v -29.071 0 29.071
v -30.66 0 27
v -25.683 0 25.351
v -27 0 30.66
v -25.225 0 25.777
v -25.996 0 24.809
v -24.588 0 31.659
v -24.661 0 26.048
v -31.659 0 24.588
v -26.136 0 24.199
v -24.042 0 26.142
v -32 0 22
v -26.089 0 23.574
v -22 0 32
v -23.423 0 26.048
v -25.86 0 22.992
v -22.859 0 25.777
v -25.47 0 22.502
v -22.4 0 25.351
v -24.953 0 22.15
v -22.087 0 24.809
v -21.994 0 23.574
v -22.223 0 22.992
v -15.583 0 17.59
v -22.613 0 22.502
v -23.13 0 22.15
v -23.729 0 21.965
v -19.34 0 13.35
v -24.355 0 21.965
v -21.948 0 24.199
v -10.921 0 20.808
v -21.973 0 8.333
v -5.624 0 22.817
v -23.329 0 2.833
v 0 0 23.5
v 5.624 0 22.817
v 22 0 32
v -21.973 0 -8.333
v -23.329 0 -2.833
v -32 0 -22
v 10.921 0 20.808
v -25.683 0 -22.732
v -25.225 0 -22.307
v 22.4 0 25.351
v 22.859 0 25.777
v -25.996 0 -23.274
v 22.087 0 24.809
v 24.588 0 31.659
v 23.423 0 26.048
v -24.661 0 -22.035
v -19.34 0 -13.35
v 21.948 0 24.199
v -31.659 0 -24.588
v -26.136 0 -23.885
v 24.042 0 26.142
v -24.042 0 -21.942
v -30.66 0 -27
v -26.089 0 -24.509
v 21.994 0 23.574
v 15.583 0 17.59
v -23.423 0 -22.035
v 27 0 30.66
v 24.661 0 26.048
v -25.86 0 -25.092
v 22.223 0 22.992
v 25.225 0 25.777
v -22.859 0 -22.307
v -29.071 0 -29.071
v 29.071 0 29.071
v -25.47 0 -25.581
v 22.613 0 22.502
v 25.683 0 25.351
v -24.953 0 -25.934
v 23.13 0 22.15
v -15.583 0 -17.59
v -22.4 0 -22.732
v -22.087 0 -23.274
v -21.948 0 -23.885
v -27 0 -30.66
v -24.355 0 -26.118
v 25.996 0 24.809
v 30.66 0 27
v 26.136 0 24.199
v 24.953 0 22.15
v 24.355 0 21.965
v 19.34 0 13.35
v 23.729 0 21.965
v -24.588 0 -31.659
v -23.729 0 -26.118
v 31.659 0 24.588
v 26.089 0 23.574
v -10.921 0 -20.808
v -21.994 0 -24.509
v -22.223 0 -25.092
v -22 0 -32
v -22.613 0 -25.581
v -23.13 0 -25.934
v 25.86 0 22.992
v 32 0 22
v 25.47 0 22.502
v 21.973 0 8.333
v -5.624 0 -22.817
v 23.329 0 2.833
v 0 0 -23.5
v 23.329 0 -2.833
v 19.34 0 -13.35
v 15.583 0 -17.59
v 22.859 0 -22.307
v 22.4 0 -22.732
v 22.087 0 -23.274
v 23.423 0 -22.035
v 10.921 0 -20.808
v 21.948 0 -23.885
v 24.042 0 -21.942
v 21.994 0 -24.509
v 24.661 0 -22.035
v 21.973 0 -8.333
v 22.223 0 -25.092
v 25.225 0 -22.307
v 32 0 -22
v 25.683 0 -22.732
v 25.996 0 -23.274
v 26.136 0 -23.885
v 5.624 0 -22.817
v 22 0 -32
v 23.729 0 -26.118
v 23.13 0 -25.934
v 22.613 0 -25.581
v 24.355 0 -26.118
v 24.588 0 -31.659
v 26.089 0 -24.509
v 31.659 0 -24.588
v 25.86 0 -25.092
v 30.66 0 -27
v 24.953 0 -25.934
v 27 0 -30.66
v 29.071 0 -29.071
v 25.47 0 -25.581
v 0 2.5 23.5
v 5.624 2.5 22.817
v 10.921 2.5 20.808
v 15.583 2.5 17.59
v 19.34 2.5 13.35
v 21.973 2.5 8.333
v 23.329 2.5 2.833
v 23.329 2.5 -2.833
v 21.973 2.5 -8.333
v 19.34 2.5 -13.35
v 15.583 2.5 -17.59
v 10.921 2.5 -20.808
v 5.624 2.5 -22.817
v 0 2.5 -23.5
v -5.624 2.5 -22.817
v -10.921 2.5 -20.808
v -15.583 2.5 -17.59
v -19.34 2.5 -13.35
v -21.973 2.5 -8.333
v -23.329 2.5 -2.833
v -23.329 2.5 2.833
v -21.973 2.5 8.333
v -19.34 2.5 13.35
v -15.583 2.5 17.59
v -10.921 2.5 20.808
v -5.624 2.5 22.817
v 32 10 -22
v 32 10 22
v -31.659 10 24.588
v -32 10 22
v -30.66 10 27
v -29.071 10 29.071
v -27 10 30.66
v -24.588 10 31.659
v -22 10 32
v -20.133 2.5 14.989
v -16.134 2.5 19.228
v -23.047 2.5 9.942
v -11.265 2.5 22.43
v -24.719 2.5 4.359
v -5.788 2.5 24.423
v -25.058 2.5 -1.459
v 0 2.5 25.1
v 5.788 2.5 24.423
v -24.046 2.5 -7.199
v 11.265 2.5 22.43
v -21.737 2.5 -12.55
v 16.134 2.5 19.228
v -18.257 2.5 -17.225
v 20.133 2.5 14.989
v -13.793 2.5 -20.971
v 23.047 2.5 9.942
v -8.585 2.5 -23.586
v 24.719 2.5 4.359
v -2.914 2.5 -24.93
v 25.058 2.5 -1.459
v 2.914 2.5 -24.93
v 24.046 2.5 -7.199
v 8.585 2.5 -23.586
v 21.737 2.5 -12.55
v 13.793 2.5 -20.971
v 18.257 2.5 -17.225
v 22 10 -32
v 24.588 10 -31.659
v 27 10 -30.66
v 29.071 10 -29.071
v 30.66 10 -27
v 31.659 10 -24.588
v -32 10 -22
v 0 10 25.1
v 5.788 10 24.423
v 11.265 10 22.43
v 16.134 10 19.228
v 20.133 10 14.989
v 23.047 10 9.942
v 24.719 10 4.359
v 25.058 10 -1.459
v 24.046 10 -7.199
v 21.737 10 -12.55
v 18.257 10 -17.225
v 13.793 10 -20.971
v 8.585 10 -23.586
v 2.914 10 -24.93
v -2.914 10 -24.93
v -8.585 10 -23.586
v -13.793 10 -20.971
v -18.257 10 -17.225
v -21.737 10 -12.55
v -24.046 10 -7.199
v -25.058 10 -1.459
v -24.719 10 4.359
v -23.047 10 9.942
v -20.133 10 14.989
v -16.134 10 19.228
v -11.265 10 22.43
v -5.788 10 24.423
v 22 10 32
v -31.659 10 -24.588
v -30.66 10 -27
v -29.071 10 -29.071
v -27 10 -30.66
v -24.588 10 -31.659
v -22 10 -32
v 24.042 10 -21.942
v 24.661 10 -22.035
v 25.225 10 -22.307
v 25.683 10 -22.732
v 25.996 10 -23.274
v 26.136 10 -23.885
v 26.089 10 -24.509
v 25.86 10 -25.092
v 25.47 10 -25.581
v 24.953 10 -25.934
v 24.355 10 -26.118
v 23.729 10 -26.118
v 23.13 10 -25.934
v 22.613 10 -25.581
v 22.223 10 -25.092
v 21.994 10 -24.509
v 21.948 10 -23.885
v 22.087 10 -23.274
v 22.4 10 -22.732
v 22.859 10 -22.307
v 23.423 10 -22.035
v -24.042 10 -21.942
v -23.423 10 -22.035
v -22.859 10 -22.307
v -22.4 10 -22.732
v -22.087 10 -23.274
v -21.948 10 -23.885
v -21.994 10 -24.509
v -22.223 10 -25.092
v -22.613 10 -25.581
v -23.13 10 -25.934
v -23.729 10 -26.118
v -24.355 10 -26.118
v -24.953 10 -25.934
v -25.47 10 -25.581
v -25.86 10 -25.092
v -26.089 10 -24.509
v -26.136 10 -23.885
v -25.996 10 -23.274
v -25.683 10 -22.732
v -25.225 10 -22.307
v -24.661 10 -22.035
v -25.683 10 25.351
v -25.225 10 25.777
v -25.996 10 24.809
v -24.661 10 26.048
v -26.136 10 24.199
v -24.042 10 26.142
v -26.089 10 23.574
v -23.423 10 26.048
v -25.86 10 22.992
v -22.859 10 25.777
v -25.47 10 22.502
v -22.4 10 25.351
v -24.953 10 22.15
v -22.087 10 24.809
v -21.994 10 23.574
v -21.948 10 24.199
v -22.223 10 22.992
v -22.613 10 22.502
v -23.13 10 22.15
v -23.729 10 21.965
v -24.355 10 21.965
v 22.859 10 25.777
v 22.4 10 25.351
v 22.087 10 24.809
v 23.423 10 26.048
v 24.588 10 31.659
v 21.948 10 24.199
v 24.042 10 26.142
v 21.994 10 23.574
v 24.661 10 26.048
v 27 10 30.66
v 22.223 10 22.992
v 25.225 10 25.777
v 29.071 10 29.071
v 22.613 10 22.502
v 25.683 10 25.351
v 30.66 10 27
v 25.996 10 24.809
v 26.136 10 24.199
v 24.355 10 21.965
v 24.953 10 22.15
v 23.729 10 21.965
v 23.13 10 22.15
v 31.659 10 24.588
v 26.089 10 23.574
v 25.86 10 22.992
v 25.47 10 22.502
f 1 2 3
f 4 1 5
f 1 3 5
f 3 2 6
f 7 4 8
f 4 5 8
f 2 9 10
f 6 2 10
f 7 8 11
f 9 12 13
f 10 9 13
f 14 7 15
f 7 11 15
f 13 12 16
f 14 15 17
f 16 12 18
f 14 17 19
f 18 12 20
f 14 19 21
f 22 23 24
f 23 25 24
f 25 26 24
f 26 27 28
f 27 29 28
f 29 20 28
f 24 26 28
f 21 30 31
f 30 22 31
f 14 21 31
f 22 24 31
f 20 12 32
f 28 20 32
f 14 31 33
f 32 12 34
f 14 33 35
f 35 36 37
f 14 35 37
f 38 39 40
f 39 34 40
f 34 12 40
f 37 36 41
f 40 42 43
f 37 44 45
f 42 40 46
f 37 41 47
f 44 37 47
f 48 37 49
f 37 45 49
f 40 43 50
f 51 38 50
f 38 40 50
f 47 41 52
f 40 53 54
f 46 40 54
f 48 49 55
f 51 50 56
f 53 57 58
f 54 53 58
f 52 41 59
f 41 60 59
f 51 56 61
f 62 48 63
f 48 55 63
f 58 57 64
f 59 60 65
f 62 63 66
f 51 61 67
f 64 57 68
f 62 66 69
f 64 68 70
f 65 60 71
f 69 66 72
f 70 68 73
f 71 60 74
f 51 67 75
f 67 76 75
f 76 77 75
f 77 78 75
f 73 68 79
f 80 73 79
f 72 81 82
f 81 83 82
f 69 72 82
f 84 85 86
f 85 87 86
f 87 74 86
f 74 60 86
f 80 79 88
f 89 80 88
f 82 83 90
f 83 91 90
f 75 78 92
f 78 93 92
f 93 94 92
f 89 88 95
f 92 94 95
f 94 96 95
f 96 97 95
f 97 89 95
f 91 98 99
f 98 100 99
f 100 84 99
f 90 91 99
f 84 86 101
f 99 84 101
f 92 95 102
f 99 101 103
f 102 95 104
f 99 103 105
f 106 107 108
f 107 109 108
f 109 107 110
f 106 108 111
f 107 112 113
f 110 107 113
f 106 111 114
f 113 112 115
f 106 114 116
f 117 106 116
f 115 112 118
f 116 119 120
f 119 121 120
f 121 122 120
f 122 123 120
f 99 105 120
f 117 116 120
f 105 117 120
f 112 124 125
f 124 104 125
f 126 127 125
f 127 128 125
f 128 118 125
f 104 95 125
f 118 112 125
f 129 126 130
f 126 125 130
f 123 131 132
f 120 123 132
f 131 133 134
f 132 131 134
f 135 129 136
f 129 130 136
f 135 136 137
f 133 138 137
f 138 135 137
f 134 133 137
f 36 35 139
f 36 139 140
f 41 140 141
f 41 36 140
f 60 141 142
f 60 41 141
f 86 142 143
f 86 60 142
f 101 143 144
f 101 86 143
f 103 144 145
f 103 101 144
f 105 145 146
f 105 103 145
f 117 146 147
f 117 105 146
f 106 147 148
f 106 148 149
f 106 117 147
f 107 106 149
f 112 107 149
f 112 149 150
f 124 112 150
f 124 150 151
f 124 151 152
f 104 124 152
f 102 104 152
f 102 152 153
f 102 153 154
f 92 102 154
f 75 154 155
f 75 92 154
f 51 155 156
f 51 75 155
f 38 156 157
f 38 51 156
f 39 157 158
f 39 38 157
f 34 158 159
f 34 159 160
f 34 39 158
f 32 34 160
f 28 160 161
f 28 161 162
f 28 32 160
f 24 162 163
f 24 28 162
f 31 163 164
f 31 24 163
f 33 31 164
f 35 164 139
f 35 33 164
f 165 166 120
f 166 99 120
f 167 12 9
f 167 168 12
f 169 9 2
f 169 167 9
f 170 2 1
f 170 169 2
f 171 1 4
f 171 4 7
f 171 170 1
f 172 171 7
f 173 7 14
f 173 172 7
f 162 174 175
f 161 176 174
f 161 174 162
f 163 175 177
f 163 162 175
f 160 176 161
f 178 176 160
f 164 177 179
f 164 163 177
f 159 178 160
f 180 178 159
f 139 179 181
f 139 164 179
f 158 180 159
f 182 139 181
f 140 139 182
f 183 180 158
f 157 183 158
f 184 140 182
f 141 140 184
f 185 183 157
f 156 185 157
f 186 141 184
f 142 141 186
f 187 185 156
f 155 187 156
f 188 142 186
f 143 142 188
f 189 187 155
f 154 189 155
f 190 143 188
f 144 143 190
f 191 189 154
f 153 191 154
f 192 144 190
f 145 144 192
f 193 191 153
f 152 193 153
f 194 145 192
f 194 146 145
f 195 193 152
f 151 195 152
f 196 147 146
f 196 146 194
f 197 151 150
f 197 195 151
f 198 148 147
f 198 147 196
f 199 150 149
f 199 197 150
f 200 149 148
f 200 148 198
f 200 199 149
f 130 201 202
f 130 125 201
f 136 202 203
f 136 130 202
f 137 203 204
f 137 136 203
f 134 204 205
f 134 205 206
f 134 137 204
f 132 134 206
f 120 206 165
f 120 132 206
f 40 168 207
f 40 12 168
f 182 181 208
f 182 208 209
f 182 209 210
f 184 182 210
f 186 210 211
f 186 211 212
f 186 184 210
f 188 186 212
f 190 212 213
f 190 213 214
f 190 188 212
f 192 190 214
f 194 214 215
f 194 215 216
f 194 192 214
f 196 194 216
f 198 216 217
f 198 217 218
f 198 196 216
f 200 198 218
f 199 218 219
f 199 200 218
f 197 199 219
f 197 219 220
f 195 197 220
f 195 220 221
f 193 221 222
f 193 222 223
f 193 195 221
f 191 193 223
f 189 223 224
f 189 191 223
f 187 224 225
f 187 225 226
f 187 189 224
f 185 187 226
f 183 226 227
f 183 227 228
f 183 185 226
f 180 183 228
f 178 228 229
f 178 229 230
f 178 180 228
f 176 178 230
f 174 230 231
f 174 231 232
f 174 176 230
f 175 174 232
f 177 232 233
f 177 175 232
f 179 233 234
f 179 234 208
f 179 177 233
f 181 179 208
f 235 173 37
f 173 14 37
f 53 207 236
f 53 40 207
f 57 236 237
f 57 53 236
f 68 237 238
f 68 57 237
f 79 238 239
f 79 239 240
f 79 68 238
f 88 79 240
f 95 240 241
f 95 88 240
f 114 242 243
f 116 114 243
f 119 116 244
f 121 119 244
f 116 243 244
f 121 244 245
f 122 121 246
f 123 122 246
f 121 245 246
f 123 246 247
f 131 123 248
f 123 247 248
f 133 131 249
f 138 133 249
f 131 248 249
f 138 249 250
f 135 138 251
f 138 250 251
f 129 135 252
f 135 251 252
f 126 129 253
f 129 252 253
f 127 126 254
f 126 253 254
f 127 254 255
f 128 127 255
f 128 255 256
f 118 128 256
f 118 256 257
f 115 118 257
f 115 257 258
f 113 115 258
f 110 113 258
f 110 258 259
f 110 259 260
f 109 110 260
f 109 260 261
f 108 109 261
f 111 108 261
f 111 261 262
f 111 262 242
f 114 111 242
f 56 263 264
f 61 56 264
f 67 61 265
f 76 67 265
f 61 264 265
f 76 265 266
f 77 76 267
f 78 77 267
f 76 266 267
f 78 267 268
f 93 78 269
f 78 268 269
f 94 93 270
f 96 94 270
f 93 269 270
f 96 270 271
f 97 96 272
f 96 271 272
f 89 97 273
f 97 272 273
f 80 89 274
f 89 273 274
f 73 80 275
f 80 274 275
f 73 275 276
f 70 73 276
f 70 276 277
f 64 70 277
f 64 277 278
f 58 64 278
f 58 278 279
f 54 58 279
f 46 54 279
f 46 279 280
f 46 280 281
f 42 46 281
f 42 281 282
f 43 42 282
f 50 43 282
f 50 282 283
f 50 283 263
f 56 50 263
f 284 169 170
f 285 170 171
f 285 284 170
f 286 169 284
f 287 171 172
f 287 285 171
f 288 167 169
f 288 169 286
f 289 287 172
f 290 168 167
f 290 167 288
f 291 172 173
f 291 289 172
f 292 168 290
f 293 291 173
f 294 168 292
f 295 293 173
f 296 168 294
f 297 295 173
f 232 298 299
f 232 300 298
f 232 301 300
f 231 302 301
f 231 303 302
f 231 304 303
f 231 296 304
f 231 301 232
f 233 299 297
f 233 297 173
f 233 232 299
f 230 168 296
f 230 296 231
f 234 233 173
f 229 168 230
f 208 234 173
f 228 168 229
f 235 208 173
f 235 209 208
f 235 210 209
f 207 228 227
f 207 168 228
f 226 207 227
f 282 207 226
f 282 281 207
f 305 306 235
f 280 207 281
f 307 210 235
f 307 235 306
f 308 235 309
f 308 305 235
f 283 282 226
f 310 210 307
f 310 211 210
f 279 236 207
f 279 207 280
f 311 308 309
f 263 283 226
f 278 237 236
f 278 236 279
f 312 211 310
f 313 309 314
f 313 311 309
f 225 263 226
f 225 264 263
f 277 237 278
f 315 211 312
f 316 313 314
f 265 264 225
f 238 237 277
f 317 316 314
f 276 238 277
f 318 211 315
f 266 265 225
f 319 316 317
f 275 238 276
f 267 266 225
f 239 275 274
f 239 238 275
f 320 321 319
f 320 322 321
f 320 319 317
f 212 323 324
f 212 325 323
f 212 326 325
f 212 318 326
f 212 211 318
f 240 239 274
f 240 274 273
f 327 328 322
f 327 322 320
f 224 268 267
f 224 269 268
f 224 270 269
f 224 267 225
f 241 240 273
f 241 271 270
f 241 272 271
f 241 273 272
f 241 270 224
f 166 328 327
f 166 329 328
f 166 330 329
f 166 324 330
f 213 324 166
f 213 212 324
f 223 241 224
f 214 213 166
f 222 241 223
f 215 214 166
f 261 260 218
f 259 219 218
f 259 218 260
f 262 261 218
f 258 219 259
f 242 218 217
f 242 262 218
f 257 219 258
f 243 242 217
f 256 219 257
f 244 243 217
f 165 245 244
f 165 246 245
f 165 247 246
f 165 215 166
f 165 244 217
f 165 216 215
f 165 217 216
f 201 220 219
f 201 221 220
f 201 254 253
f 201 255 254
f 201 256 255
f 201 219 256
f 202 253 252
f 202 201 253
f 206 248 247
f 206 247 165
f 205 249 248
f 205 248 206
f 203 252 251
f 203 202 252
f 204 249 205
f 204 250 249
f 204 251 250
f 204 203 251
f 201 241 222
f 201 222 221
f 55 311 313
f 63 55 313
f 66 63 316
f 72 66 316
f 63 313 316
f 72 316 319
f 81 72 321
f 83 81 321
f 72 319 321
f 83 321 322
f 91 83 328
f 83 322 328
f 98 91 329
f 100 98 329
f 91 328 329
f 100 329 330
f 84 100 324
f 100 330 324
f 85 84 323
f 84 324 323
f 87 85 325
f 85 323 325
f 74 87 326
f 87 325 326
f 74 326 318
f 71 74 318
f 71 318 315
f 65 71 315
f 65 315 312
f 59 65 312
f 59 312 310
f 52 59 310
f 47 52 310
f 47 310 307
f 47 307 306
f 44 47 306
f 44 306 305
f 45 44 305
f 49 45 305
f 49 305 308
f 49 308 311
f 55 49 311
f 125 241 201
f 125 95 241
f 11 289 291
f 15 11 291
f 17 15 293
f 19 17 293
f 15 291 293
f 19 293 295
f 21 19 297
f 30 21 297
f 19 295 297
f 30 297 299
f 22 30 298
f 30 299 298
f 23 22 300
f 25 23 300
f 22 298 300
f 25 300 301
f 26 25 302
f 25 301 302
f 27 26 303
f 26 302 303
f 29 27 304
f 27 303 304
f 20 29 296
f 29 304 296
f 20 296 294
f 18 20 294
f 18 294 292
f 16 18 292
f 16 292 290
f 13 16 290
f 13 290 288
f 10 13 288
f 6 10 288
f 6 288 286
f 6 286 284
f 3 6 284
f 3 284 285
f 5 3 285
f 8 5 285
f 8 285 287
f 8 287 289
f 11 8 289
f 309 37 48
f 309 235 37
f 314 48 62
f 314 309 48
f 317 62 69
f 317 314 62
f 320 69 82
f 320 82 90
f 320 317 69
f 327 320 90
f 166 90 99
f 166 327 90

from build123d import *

# Parameters (mm, degrees)
SKETCH_1_W          = 64
SKETCH_1_H          = 64
SKETCH_1_R          = 23.5
EXTRUDE_1_DEPTH     = 2.5
SKETCH_2_W          = 64
SKETCH_2_H          = 64
SKETCH_2_R          = 25.1
EXTRUDE_2_DEPTH     = 7.5
SKETCH_3_R          = 2.1
CUT_EXTRUDE_1_DEPTH = 20
FILLET_1_R          = 10


with BuildPart() as part:
    # 草图1 → 凸台-拉伸1 (new body)
    with BuildSketch(Plane(origin=(0, 0, 0), x_dir=(1, 0, 0), z_dir=(0, 1, 0))):
        Rectangle(SKETCH_1_W, SKETCH_1_H)
        with Locations(Location((0, 0, 0), (0, 0, 270))):
            Circle(SKETCH_1_R, mode=Mode.SUBTRACT)
    extrude(amount=EXTRUDE_1_DEPTH)

    # 草图2 → 凸台-拉伸2 (add)
    with BuildSketch(Plane(origin=(0, 2.5, 0), x_dir=(1, 0, 0), z_dir=(0, 1, 0))):
        Rectangle(SKETCH_2_W, SKETCH_2_H)
        with Locations(Location((0, 0, 0), (0, 0, 270))):
            Circle(SKETCH_2_R, mode=Mode.SUBTRACT)
    extrude(amount=EXTRUDE_2_DEPTH)

    # 草图3 → 切除-拉伸1 (cut)
    with BuildSketch(Plane(origin=(0, 10, 0), x_dir=(1, 0, 0), z_dir=(0, 1, 0))):
        with Locations(Location((24.04163056, 24.04163056, 0), (0, 0, 270))):
            Circle(SKETCH_3_R)
        with Locations(Location((24.04163056, -24.04163056, 0), (0, 0, 270))):
            Circle(SKETCH_3_R)
        with Locations(Location((-24.04163056, -24.04163056, 0), (0, 0, 270))):
            Circle(SKETCH_3_R)
        with Locations(Location((-24.04163056, 24.04163056, 0), (0, 0, 270))):
            Circle(SKETCH_3_R)
    extrude(amount=-CUT_EXTRUDE_1_DEPTH, mode=Mode.SUBTRACT)

    # 圆角1
    fillet_1_edges = [part.edges().sort_by_distance(p)[0] for p in [
        (32, 5, 32),
        (-32, 5, 32),
        (-32, 5, -32),
        (32, 5, -32),
    ]]
    fillet(fillet_1_edges, radius=FILLET_1_R)


solid = part.part
